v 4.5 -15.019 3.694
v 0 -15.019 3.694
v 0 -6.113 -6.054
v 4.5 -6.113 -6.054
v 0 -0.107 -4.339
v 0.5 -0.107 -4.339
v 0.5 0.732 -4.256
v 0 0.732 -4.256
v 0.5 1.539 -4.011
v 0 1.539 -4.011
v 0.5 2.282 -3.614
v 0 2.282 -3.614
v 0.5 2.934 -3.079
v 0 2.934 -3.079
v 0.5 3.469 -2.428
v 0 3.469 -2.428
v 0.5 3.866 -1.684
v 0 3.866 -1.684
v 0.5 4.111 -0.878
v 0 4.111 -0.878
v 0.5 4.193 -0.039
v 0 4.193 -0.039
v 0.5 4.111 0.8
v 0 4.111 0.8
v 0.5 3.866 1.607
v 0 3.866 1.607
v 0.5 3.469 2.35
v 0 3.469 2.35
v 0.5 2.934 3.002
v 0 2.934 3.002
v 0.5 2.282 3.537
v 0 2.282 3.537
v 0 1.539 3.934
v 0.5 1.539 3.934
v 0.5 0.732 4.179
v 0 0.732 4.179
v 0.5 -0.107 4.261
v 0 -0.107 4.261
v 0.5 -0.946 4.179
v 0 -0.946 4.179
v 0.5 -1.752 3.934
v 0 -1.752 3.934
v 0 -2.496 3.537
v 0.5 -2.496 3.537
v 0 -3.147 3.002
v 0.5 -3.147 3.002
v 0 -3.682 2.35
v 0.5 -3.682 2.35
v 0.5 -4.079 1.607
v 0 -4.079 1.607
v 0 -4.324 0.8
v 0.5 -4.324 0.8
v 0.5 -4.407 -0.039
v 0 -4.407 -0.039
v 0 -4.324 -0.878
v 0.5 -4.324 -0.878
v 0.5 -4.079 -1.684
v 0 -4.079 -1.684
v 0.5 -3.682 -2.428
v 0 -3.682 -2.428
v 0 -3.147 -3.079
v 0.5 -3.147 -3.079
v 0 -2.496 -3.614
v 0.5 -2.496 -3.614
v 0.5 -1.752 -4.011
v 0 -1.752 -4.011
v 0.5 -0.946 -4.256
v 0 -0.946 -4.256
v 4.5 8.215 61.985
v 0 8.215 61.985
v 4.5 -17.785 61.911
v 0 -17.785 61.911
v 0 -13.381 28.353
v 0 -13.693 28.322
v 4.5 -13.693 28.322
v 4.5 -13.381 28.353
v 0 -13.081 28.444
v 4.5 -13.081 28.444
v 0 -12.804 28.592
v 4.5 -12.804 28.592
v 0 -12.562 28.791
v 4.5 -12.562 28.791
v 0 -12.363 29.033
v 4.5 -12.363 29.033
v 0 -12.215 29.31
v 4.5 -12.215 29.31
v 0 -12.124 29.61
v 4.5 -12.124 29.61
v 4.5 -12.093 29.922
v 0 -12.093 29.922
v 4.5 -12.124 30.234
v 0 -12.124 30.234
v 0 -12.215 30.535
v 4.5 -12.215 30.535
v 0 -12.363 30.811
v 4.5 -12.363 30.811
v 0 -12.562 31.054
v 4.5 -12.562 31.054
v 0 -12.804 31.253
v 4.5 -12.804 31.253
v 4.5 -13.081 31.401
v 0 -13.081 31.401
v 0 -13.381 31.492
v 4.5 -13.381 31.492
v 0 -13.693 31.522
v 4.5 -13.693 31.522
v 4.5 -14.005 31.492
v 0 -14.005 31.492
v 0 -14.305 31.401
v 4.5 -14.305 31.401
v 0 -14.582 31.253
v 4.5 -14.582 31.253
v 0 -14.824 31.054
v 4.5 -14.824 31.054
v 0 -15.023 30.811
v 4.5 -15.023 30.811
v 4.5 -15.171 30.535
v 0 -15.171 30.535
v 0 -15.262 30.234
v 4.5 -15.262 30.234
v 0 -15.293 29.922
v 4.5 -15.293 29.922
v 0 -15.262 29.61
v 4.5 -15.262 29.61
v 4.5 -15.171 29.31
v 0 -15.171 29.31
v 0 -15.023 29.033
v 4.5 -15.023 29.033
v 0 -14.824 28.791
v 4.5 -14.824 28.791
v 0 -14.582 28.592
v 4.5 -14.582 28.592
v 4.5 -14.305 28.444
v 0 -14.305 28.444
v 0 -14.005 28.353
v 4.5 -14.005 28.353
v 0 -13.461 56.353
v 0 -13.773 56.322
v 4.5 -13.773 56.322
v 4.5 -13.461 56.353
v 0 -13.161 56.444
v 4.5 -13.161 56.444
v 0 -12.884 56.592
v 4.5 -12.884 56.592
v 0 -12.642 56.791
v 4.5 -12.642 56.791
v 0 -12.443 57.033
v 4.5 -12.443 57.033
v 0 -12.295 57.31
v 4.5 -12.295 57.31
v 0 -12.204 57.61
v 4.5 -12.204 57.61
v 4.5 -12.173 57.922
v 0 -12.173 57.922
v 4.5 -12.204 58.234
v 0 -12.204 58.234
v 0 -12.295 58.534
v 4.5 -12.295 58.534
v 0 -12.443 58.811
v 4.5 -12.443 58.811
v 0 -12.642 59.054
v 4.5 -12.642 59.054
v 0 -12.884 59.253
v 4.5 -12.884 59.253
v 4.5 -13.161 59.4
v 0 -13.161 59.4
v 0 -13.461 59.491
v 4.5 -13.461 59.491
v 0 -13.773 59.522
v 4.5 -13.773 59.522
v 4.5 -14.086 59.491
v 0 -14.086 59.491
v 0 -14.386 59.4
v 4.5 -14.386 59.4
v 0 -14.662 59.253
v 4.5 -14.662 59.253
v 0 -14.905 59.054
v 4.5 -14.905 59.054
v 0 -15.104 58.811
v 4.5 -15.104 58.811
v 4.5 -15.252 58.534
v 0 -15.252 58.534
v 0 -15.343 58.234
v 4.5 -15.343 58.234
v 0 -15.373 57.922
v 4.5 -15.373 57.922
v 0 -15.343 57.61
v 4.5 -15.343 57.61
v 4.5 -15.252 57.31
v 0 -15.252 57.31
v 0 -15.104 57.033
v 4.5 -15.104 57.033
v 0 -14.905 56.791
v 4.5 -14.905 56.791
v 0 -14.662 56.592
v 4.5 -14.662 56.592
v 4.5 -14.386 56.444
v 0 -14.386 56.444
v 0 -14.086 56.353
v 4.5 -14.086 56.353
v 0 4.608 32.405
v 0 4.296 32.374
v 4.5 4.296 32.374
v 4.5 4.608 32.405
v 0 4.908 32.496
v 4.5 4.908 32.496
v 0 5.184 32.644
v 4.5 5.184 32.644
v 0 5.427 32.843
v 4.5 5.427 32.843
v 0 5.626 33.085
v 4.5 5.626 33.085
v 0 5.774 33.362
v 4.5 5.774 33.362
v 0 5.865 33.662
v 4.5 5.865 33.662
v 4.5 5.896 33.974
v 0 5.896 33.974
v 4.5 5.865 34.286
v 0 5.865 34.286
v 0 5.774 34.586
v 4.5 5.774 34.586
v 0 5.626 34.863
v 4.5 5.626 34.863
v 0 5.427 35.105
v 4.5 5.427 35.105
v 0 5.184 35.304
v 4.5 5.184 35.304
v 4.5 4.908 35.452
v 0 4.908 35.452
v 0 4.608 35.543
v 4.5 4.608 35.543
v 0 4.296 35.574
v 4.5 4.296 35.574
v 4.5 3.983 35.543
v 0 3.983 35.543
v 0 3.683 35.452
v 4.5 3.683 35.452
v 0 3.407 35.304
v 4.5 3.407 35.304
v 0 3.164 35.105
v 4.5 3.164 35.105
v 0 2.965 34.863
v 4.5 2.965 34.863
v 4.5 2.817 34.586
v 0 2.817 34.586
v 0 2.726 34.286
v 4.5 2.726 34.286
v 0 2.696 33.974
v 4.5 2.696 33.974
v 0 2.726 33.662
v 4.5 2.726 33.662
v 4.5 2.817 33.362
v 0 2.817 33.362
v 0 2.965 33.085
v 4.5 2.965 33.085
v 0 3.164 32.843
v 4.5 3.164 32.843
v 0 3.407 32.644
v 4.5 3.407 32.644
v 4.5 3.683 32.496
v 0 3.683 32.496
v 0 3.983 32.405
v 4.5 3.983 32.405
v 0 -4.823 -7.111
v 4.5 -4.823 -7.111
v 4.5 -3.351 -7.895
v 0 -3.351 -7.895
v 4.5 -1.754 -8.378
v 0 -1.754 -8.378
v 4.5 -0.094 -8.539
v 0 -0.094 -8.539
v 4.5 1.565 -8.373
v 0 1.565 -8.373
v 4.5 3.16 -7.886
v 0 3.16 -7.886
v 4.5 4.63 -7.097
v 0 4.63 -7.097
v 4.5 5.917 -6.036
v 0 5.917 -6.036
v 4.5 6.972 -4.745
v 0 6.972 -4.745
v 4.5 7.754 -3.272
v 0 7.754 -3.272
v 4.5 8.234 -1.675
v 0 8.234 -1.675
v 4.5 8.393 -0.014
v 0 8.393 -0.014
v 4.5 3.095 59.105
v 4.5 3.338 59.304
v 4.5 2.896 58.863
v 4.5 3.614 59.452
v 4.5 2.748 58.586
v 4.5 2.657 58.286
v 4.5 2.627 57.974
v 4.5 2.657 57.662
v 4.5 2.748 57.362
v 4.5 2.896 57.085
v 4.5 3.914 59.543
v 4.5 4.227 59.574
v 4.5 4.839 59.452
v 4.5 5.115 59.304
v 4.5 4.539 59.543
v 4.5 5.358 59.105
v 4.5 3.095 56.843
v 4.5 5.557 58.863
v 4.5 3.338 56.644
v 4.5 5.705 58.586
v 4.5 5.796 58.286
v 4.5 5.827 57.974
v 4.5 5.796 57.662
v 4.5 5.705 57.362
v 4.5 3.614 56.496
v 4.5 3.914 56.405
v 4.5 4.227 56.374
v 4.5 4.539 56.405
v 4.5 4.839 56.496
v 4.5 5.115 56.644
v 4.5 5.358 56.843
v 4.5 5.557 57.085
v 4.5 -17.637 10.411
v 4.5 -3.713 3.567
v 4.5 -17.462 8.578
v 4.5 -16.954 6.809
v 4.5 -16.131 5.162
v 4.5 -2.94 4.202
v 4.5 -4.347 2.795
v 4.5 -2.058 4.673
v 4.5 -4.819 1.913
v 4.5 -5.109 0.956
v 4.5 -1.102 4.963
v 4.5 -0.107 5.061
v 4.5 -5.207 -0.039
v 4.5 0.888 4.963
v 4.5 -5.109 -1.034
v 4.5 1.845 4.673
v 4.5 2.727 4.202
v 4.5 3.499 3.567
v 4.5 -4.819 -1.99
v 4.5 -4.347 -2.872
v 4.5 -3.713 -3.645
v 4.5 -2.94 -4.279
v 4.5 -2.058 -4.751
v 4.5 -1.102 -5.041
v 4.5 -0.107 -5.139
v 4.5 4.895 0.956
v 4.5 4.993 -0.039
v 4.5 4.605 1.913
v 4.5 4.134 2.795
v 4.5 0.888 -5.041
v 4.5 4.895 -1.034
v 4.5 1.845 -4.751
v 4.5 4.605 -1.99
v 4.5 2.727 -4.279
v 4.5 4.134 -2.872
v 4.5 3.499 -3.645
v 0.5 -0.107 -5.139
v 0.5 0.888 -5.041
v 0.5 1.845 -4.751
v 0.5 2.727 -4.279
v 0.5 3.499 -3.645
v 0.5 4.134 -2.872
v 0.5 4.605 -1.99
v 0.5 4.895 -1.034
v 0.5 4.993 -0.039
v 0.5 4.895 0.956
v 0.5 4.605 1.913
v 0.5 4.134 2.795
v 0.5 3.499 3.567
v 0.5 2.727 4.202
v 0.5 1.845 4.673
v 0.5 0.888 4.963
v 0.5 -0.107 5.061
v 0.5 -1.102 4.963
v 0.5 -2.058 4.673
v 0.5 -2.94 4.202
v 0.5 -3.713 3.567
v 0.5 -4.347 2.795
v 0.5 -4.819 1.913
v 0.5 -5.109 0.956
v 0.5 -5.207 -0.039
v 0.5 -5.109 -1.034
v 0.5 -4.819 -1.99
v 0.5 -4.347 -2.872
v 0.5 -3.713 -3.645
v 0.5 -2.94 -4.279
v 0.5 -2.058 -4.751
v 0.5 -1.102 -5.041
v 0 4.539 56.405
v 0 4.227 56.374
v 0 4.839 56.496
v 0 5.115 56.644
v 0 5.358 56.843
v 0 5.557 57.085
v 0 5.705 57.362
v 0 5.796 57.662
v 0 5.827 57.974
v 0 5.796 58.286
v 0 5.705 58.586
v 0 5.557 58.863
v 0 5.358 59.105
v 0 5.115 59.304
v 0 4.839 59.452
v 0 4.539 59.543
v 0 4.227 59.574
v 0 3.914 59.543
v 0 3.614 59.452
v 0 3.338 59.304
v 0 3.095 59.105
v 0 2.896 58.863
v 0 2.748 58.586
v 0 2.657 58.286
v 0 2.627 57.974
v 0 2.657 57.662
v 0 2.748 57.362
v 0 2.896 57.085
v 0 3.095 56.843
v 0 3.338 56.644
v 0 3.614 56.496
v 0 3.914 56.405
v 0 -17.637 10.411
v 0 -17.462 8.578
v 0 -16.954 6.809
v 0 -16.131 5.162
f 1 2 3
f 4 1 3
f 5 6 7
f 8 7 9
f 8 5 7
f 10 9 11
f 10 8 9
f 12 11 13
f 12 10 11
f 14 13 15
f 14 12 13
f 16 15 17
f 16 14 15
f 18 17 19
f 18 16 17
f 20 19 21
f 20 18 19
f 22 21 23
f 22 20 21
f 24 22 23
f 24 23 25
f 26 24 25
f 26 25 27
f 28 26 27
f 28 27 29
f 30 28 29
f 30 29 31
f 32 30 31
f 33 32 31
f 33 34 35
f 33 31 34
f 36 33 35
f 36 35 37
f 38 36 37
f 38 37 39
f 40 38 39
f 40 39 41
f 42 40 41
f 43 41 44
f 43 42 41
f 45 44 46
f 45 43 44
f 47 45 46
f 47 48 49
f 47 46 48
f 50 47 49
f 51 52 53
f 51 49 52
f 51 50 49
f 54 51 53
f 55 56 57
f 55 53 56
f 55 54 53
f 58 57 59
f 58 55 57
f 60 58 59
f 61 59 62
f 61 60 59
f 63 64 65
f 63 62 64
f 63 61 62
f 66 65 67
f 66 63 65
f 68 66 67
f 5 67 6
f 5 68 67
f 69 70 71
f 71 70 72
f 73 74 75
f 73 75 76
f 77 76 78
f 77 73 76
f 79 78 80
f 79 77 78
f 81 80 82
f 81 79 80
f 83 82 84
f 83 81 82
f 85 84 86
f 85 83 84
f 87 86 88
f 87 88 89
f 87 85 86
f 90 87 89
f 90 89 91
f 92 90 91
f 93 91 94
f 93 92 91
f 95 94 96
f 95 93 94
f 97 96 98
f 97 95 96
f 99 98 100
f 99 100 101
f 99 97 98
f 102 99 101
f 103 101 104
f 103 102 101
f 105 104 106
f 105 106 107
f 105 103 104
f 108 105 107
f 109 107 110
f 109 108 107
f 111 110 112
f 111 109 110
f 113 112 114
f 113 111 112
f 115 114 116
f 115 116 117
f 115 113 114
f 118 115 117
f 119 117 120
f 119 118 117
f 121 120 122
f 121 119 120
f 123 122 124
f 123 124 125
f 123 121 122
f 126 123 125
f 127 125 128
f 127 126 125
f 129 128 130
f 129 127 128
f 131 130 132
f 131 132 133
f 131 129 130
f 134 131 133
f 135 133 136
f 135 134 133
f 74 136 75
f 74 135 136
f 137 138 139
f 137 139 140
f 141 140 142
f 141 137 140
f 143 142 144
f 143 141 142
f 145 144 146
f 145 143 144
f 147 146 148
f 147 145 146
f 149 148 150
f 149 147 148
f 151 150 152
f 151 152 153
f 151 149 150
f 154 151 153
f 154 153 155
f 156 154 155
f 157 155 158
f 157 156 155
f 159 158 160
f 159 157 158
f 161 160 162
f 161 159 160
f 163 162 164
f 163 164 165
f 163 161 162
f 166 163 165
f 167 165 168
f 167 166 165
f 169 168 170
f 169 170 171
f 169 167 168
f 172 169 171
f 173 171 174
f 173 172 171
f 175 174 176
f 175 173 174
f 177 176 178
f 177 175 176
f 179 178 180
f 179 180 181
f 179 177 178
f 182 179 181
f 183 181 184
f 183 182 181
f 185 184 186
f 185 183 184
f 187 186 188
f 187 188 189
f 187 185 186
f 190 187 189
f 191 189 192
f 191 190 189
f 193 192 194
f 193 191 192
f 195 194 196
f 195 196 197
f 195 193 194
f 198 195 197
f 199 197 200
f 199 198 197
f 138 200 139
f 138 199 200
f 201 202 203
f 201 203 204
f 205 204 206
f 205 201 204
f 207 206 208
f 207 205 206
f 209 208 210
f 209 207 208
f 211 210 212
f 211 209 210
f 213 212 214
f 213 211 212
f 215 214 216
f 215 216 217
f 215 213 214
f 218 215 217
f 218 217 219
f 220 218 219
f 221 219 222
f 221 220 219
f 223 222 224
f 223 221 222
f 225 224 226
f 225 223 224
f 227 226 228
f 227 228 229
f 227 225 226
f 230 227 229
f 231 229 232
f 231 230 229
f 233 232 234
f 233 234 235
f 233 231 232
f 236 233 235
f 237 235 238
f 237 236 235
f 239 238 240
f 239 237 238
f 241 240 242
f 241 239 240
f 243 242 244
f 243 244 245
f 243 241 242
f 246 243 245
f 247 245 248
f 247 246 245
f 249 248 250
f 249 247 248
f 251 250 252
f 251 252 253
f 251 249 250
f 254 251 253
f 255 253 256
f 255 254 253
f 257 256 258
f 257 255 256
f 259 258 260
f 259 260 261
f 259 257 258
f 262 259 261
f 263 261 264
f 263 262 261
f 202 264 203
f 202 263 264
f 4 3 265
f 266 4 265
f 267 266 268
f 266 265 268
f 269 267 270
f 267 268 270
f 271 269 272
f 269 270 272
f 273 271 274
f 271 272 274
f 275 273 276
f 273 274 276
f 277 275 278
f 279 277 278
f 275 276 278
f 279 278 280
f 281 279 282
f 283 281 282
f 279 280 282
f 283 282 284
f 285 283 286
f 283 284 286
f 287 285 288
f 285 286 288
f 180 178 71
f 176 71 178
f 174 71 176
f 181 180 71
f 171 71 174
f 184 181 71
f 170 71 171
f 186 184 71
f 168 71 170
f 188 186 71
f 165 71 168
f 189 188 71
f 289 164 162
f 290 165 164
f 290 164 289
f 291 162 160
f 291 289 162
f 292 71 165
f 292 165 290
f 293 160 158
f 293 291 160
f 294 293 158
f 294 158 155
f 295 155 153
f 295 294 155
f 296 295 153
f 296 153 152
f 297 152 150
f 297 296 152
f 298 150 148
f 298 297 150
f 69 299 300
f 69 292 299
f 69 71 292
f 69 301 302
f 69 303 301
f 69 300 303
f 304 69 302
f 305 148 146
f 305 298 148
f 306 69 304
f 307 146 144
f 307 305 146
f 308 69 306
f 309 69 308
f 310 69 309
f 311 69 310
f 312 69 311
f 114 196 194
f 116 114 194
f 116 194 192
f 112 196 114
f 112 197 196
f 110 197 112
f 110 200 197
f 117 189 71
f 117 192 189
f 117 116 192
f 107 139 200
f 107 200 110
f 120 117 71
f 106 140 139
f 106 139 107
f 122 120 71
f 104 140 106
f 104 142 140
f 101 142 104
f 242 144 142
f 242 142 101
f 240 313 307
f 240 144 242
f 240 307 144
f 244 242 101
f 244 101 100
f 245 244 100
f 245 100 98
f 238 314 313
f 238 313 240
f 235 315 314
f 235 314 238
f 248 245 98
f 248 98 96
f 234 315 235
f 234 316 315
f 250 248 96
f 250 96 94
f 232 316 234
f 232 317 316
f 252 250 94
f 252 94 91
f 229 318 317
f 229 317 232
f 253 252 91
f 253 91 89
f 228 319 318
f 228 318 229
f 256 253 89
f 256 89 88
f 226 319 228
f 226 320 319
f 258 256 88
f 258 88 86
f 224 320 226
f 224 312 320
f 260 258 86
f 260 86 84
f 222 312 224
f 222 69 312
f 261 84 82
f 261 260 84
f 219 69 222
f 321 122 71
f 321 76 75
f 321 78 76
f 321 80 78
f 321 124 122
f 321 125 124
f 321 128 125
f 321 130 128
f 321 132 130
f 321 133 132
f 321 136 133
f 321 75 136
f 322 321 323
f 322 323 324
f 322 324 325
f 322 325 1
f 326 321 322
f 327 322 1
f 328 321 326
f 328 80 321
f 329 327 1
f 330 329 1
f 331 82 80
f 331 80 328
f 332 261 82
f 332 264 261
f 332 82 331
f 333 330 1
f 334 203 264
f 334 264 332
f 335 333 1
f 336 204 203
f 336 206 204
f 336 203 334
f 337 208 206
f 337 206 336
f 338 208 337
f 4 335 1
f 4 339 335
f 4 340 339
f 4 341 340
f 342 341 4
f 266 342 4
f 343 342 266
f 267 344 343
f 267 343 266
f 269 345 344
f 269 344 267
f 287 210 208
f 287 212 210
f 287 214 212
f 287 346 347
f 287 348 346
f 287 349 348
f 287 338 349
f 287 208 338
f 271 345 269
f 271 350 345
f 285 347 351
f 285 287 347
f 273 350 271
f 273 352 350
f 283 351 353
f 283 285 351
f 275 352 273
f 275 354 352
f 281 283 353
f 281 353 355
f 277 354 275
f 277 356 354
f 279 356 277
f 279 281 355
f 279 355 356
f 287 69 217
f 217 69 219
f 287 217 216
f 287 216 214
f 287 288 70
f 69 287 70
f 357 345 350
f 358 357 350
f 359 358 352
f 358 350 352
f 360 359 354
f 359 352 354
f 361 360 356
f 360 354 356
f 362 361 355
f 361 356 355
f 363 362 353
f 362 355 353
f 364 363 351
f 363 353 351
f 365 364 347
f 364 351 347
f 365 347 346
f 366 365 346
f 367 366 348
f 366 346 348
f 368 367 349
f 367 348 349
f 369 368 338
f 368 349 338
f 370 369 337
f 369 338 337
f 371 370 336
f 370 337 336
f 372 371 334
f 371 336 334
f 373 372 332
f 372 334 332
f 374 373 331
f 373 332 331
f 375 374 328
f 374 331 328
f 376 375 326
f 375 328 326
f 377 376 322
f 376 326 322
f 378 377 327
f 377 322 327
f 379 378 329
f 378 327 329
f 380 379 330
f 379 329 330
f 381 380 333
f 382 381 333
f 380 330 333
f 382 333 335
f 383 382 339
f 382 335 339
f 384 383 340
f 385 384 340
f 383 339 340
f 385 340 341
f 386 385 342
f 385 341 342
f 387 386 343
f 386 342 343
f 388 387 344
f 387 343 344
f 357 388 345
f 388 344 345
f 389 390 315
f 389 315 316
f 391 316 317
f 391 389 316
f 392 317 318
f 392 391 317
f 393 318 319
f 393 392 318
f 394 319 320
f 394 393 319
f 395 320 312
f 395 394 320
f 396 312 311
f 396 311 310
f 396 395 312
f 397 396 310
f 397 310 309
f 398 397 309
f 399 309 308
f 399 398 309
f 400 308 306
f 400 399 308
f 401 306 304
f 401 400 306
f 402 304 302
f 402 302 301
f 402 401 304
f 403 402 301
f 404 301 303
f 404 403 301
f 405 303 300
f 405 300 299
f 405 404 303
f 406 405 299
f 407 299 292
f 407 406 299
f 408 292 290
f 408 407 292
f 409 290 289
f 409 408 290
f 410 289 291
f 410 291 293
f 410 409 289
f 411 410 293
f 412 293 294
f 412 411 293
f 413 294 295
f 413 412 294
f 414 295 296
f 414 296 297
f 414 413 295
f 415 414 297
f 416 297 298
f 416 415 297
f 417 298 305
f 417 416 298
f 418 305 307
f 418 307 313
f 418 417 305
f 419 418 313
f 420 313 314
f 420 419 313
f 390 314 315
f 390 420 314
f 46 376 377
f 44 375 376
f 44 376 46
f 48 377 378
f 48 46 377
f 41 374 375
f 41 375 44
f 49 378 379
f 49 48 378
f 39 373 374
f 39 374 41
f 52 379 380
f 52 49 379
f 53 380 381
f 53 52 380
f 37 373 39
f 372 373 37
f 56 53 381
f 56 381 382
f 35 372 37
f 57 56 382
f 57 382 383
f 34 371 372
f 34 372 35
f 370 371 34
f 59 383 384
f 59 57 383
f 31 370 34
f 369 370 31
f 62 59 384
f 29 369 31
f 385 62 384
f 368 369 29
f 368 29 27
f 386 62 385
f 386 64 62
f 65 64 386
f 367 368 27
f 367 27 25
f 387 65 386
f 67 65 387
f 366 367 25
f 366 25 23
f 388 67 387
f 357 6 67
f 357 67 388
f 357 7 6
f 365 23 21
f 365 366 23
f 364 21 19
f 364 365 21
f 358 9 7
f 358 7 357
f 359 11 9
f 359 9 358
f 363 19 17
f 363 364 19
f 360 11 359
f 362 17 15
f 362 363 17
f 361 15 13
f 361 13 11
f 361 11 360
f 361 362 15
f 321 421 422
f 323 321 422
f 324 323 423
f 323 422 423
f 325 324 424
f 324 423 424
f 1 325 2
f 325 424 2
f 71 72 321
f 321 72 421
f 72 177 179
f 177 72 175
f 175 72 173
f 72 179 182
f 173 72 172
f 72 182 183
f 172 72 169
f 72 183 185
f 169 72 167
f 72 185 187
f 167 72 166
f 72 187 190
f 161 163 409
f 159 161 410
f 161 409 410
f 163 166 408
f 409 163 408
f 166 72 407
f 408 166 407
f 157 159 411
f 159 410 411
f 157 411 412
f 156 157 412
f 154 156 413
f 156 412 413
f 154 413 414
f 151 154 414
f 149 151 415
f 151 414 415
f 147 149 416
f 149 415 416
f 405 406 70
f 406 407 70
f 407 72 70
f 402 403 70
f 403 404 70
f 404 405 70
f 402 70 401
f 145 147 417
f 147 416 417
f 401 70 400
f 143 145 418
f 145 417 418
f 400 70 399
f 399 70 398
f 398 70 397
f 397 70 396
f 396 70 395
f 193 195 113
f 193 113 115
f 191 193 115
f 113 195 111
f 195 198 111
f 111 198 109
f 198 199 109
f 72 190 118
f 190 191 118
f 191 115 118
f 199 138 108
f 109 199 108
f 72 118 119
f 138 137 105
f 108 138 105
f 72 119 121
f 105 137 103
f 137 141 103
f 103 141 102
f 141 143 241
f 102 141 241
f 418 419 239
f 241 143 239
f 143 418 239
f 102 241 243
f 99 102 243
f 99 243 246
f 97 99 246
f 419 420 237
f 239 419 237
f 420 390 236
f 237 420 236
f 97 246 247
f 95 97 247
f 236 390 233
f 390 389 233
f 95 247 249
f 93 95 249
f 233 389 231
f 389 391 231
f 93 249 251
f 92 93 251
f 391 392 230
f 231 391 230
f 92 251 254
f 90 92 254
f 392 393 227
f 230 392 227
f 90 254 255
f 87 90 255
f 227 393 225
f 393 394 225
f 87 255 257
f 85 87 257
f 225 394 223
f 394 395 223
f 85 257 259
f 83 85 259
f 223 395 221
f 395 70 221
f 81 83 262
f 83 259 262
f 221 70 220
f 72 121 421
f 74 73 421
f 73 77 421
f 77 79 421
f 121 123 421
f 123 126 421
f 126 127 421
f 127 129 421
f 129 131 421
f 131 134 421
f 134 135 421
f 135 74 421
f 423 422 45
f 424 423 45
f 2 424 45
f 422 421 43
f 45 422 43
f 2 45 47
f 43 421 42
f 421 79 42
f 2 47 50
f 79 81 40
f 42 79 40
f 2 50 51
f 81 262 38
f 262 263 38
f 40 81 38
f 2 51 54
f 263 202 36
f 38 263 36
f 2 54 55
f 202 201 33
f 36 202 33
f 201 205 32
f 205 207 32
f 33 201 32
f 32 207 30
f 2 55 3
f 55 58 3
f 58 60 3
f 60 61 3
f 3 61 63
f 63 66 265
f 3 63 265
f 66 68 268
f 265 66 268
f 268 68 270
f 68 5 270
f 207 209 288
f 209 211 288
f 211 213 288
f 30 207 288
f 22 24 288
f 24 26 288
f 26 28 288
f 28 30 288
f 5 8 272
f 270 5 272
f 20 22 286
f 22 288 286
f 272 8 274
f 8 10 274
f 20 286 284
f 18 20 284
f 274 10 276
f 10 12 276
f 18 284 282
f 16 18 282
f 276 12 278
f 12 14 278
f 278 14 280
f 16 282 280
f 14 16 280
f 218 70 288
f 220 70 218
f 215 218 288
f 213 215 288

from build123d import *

# Parameters (mm, degrees)
SKETCH_1_R          = 4.3
SKETCH_1_R_2        = 1.6
EXTRUDE_1_DEPTH     = 4.5
SKETCH_2_R          = 5.1
CUT_EXTRUDE_1_DEPTH = 4


with BuildPart() as part:
    # 草图1 → 凸台-拉伸1 (new body)
    with BuildSketch(Plane(origin=(0, 0, 0), x_dir=(0, 0, -1), z_dir=(1, 0, 0))):
        with BuildLine():
            Line((-61.910667188, -17.784854846), (-10.410879829, -17.636861799))
            ThreePointArc((-10.410879829, -17.636861799), (-6.80853031, -16.954371319), (-3.69429735, -15.01936011))
            Line((-3.69429735, -15.01936011), (6.053738335, -6.112622142))
            ThreePointArc((6.053738335, -6.112622142), (7.885847556, 3.160295303), (0.014361881, 8.393204188))
            Line((0.014361881, 8.393204188), (-61.985382125, 8.215037801))
            Line((-61.985382125, 8.215037801), (-61.910667188, -17.784854846))
        make_face()
        with Locations((0.038787918, -0.106760716)):
            Circle(SKETCH_1_R, mode=Mode.SUBTRACT)
        with Locations((-57.973904035, 4.226548923)):
            Circle(SKETCH_1_R_2, mode=Mode.SUBTRACT)
        with Locations((-29.92229392, -13.692914517)):
            Circle(SKETCH_1_R_2, mode=Mode.SUBTRACT)
        with Locations((-33.97400313, 4.295516556)):
            Circle(SKETCH_1_R_2, mode=Mode.SUBTRACT)
        with Locations((-57.92217831, -13.773376756)):
            Circle(SKETCH_1_R_2, mode=Mode.SUBTRACT)
    extrude(amount=EXTRUDE_1_DEPTH)

    # 草图2 → 切除-拉伸1 (cut)
    with BuildSketch(Plane(origin=(4.5, 0, 0), x_dir=(0, 0, -1), z_dir=(1, 0, 0))):
        with Locations((0.038787918, -0.106760716)):
            Circle(SKETCH_2_R)
    extrude(amount=-CUT_EXTRUDE_1_DEPTH, mode=Mode.SUBTRACT)


solid = part.part
